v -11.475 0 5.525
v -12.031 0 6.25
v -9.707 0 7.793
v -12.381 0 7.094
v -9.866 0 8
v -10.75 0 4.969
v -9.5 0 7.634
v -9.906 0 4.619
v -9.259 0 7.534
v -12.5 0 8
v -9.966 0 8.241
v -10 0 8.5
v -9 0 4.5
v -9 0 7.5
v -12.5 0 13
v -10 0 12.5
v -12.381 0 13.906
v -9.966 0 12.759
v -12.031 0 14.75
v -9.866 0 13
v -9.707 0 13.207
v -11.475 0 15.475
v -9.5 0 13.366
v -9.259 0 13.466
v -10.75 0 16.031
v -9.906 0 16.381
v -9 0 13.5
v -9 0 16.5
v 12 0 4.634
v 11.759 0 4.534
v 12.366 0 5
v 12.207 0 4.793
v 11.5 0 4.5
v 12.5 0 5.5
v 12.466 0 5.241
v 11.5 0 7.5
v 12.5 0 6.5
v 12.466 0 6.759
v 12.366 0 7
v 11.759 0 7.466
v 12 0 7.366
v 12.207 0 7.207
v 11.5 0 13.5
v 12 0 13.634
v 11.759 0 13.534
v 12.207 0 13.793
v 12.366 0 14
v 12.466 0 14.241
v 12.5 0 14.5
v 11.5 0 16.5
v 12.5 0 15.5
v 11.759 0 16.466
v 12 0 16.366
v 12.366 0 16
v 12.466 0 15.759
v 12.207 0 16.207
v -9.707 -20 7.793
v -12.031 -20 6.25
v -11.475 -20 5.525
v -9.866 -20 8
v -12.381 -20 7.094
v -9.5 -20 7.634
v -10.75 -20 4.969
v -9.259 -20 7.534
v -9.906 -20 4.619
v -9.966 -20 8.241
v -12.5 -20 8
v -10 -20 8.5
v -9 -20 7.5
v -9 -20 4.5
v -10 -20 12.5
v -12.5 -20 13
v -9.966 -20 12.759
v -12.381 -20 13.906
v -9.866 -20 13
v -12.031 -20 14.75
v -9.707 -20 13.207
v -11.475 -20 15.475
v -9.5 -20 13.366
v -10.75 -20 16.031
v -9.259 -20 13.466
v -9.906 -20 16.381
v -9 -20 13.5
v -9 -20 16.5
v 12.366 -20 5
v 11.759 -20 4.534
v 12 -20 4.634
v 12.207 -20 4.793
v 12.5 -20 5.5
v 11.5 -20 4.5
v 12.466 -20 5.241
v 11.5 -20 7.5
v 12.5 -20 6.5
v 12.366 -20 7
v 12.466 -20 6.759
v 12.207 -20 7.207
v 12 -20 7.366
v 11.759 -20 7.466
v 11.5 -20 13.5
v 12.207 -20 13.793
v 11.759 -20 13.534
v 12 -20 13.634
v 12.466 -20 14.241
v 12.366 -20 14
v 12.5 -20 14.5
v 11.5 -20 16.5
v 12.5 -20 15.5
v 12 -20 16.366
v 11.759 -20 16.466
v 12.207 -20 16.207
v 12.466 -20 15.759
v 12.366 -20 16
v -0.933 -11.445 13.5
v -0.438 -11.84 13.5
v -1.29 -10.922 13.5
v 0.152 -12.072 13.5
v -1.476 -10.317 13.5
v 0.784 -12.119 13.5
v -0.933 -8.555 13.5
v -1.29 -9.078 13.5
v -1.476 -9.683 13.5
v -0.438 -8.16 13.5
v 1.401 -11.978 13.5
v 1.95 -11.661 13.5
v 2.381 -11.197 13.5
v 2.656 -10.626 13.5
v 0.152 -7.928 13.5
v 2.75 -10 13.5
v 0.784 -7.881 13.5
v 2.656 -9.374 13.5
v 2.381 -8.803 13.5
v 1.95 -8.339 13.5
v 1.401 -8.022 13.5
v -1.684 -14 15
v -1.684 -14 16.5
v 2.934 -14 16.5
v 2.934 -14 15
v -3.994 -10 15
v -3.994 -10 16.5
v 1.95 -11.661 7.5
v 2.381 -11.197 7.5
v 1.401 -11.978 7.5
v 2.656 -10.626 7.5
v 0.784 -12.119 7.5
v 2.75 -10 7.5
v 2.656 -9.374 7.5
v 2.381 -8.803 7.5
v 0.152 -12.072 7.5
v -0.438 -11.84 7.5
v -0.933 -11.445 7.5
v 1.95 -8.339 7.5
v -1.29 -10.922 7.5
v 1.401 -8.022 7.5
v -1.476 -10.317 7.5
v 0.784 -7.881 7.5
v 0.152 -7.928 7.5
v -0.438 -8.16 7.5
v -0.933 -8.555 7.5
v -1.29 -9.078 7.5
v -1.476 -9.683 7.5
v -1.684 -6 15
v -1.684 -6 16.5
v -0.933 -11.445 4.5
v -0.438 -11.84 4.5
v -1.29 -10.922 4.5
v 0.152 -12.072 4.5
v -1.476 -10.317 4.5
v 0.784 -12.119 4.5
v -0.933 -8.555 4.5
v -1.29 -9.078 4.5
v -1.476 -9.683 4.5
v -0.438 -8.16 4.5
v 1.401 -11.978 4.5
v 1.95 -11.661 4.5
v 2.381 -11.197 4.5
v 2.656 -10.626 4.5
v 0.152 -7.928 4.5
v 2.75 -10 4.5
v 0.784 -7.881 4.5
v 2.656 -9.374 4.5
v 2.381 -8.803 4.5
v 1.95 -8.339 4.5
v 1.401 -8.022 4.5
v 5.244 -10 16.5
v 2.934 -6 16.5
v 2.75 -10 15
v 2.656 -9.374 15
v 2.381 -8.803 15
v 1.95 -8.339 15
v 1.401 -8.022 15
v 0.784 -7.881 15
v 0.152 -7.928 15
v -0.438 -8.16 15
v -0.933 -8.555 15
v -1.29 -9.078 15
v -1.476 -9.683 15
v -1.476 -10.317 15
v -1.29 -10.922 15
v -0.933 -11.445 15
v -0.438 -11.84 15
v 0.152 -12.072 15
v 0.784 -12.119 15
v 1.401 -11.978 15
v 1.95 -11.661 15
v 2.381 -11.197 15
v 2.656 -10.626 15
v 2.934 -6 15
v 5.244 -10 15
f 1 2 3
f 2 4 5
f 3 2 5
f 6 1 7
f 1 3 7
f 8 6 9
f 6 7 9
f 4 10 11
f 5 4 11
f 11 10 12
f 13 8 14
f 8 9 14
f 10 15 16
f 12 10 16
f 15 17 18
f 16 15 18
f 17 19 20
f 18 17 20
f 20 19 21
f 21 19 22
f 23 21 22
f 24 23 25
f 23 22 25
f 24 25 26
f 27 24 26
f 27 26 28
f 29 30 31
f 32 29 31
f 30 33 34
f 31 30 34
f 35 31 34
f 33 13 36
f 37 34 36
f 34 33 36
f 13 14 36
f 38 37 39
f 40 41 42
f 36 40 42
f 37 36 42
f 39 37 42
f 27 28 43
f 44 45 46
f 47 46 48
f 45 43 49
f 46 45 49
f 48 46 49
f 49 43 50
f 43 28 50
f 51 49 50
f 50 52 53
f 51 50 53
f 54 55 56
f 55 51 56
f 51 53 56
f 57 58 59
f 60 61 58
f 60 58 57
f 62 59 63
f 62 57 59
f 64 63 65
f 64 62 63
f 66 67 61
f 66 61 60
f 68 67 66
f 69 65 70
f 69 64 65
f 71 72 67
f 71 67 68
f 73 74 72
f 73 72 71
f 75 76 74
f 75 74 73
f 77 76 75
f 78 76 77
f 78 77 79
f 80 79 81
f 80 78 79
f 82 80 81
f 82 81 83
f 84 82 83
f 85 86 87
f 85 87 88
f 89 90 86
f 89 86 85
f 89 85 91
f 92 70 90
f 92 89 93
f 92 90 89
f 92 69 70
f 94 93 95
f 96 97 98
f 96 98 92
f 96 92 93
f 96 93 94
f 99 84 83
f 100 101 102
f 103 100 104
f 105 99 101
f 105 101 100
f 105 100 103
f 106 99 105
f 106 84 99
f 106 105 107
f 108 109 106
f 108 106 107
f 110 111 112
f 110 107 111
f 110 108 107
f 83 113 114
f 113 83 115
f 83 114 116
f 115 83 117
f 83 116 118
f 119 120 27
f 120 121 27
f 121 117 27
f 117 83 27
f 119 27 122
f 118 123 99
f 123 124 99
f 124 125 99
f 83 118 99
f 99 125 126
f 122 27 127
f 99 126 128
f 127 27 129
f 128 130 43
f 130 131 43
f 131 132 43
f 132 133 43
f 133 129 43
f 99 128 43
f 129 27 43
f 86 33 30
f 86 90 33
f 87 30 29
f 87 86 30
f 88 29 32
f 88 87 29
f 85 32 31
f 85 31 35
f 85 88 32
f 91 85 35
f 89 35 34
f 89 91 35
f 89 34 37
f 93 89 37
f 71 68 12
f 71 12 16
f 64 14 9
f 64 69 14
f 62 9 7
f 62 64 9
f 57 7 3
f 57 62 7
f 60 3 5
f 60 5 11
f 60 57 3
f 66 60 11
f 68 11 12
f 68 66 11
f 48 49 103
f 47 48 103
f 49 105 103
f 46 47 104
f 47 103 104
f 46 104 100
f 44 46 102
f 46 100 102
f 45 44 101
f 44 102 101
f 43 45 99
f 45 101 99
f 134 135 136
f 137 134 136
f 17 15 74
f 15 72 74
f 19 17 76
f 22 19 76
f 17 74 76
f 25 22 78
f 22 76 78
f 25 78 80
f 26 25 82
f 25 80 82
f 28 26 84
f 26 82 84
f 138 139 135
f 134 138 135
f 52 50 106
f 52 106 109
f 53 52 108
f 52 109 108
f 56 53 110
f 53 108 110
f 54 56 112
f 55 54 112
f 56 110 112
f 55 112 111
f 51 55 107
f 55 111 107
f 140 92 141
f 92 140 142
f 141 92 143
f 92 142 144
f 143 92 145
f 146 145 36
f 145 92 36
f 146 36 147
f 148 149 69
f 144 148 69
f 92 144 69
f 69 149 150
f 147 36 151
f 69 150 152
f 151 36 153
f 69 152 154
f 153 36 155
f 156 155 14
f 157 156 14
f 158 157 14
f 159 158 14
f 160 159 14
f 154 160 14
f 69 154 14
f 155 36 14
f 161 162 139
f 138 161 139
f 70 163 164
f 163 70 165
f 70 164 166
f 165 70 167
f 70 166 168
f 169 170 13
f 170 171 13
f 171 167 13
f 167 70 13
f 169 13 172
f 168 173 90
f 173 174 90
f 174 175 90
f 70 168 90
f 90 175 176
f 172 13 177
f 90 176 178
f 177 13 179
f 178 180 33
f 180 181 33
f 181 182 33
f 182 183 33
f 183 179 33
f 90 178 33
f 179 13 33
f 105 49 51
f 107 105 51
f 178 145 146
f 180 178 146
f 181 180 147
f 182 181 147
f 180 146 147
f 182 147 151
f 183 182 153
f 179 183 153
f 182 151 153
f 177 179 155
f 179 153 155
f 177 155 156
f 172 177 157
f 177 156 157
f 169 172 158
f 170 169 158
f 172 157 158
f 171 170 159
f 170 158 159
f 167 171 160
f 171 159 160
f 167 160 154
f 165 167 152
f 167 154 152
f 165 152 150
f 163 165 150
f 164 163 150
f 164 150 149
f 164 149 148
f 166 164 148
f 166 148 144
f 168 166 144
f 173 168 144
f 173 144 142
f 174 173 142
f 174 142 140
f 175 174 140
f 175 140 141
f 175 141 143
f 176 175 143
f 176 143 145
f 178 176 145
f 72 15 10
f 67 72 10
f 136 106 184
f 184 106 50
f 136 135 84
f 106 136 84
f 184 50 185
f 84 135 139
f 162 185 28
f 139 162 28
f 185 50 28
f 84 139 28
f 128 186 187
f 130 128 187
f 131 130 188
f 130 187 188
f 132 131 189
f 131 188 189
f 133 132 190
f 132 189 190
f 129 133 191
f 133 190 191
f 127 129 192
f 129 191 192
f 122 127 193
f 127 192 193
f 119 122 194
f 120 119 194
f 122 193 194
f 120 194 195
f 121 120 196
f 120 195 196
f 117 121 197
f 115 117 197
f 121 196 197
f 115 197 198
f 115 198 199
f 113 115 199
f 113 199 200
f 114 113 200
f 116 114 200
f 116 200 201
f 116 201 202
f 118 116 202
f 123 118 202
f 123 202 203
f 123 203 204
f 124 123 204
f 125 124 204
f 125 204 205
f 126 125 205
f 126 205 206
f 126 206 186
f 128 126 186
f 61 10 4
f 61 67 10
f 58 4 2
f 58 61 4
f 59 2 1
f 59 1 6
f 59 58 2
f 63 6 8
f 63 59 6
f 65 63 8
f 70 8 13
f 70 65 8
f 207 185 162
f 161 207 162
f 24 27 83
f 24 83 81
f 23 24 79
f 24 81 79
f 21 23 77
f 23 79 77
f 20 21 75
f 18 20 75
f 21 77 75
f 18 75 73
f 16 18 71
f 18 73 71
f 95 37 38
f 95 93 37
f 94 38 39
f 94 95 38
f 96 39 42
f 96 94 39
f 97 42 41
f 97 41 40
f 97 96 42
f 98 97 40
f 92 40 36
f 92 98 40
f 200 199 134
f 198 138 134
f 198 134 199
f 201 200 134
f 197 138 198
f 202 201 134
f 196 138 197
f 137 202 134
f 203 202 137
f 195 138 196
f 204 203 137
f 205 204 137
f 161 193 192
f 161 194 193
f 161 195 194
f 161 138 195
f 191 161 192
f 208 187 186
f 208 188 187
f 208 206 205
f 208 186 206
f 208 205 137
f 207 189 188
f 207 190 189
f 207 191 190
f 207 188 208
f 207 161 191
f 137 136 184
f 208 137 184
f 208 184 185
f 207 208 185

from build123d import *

# Parameters (mm, degrees)
F1_DEPTH = 20
F2_R     = 2.125
F3_DEPTH = 12
F4_R     = 2.125
F5_DEPTH = 1.5
F6_R     = 3.5
F7_R     = 1


with BuildPart() as f1:
    # F0 (on Front) → F1 (new body)
    with BuildSketch(Plane.XZ):
        Polygon((-12.5, 16.5), (-12.5, 11.75), (-12.5, 9.25), (-12.5, 7.5), (-12.5, 4.5), (12.5, 4.5), (12.5, 7.5), (-10, 7.5), (-10, 13.5), (12.5, 13.5), (12.5, 16.5), align=None)
    extrude(amount=F1_DEPTH)

    # F2 (on face) → F3 (cut, through all)
    with BuildSketch(Plane.XY.offset(16.5)):
        with Locations((0.625, -10)):
            Circle(F2_R)
    extrude(amount=-F3_DEPTH, mode=Mode.SUBTRACT)

    # F4 (on face) → F5 (cut)
    with BuildSketch(Plane.XY.offset(16.5)):
        Polygon((2.9344010768, -14), (5.2438021535, -10), (2.9344010768, -6), (-1.6844010768, -6), (-3.9938021535, -10), (-1.6844010768, -14), align=None)
        with Locations((0.625, -10)):
            Circle(F4_R, mode=Mode.SUBTRACT)
    extrude(amount=-F5_DEPTH, mode=Mode.SUBTRACT)

    # F6
    f6_edges = [f1.edges().sort_by_distance(p)[0] for p in [
        (-12.5, -10, 4.5),
        (-12.5, -10, 16.5),
    ]]
    fillet(f6_edges, radius=F6_R)

    # F7
    f7_edges = [f1.edges().sort_by_distance(p)[0] for p in [
        (-10, -10, 13.5),
        (-10, -10, 7.5),
        (12.5, -10, 7.5),
        (12.5, -10, 13.5),
        (-9, -10, 4.5),
        (-9, -10, 16.5),
        (12.5, -10, 4.5),
        (12.5, -10, 16.5),
    ]]
    fillet(f7_edges, radius=F7_R)


solid = f1.part
